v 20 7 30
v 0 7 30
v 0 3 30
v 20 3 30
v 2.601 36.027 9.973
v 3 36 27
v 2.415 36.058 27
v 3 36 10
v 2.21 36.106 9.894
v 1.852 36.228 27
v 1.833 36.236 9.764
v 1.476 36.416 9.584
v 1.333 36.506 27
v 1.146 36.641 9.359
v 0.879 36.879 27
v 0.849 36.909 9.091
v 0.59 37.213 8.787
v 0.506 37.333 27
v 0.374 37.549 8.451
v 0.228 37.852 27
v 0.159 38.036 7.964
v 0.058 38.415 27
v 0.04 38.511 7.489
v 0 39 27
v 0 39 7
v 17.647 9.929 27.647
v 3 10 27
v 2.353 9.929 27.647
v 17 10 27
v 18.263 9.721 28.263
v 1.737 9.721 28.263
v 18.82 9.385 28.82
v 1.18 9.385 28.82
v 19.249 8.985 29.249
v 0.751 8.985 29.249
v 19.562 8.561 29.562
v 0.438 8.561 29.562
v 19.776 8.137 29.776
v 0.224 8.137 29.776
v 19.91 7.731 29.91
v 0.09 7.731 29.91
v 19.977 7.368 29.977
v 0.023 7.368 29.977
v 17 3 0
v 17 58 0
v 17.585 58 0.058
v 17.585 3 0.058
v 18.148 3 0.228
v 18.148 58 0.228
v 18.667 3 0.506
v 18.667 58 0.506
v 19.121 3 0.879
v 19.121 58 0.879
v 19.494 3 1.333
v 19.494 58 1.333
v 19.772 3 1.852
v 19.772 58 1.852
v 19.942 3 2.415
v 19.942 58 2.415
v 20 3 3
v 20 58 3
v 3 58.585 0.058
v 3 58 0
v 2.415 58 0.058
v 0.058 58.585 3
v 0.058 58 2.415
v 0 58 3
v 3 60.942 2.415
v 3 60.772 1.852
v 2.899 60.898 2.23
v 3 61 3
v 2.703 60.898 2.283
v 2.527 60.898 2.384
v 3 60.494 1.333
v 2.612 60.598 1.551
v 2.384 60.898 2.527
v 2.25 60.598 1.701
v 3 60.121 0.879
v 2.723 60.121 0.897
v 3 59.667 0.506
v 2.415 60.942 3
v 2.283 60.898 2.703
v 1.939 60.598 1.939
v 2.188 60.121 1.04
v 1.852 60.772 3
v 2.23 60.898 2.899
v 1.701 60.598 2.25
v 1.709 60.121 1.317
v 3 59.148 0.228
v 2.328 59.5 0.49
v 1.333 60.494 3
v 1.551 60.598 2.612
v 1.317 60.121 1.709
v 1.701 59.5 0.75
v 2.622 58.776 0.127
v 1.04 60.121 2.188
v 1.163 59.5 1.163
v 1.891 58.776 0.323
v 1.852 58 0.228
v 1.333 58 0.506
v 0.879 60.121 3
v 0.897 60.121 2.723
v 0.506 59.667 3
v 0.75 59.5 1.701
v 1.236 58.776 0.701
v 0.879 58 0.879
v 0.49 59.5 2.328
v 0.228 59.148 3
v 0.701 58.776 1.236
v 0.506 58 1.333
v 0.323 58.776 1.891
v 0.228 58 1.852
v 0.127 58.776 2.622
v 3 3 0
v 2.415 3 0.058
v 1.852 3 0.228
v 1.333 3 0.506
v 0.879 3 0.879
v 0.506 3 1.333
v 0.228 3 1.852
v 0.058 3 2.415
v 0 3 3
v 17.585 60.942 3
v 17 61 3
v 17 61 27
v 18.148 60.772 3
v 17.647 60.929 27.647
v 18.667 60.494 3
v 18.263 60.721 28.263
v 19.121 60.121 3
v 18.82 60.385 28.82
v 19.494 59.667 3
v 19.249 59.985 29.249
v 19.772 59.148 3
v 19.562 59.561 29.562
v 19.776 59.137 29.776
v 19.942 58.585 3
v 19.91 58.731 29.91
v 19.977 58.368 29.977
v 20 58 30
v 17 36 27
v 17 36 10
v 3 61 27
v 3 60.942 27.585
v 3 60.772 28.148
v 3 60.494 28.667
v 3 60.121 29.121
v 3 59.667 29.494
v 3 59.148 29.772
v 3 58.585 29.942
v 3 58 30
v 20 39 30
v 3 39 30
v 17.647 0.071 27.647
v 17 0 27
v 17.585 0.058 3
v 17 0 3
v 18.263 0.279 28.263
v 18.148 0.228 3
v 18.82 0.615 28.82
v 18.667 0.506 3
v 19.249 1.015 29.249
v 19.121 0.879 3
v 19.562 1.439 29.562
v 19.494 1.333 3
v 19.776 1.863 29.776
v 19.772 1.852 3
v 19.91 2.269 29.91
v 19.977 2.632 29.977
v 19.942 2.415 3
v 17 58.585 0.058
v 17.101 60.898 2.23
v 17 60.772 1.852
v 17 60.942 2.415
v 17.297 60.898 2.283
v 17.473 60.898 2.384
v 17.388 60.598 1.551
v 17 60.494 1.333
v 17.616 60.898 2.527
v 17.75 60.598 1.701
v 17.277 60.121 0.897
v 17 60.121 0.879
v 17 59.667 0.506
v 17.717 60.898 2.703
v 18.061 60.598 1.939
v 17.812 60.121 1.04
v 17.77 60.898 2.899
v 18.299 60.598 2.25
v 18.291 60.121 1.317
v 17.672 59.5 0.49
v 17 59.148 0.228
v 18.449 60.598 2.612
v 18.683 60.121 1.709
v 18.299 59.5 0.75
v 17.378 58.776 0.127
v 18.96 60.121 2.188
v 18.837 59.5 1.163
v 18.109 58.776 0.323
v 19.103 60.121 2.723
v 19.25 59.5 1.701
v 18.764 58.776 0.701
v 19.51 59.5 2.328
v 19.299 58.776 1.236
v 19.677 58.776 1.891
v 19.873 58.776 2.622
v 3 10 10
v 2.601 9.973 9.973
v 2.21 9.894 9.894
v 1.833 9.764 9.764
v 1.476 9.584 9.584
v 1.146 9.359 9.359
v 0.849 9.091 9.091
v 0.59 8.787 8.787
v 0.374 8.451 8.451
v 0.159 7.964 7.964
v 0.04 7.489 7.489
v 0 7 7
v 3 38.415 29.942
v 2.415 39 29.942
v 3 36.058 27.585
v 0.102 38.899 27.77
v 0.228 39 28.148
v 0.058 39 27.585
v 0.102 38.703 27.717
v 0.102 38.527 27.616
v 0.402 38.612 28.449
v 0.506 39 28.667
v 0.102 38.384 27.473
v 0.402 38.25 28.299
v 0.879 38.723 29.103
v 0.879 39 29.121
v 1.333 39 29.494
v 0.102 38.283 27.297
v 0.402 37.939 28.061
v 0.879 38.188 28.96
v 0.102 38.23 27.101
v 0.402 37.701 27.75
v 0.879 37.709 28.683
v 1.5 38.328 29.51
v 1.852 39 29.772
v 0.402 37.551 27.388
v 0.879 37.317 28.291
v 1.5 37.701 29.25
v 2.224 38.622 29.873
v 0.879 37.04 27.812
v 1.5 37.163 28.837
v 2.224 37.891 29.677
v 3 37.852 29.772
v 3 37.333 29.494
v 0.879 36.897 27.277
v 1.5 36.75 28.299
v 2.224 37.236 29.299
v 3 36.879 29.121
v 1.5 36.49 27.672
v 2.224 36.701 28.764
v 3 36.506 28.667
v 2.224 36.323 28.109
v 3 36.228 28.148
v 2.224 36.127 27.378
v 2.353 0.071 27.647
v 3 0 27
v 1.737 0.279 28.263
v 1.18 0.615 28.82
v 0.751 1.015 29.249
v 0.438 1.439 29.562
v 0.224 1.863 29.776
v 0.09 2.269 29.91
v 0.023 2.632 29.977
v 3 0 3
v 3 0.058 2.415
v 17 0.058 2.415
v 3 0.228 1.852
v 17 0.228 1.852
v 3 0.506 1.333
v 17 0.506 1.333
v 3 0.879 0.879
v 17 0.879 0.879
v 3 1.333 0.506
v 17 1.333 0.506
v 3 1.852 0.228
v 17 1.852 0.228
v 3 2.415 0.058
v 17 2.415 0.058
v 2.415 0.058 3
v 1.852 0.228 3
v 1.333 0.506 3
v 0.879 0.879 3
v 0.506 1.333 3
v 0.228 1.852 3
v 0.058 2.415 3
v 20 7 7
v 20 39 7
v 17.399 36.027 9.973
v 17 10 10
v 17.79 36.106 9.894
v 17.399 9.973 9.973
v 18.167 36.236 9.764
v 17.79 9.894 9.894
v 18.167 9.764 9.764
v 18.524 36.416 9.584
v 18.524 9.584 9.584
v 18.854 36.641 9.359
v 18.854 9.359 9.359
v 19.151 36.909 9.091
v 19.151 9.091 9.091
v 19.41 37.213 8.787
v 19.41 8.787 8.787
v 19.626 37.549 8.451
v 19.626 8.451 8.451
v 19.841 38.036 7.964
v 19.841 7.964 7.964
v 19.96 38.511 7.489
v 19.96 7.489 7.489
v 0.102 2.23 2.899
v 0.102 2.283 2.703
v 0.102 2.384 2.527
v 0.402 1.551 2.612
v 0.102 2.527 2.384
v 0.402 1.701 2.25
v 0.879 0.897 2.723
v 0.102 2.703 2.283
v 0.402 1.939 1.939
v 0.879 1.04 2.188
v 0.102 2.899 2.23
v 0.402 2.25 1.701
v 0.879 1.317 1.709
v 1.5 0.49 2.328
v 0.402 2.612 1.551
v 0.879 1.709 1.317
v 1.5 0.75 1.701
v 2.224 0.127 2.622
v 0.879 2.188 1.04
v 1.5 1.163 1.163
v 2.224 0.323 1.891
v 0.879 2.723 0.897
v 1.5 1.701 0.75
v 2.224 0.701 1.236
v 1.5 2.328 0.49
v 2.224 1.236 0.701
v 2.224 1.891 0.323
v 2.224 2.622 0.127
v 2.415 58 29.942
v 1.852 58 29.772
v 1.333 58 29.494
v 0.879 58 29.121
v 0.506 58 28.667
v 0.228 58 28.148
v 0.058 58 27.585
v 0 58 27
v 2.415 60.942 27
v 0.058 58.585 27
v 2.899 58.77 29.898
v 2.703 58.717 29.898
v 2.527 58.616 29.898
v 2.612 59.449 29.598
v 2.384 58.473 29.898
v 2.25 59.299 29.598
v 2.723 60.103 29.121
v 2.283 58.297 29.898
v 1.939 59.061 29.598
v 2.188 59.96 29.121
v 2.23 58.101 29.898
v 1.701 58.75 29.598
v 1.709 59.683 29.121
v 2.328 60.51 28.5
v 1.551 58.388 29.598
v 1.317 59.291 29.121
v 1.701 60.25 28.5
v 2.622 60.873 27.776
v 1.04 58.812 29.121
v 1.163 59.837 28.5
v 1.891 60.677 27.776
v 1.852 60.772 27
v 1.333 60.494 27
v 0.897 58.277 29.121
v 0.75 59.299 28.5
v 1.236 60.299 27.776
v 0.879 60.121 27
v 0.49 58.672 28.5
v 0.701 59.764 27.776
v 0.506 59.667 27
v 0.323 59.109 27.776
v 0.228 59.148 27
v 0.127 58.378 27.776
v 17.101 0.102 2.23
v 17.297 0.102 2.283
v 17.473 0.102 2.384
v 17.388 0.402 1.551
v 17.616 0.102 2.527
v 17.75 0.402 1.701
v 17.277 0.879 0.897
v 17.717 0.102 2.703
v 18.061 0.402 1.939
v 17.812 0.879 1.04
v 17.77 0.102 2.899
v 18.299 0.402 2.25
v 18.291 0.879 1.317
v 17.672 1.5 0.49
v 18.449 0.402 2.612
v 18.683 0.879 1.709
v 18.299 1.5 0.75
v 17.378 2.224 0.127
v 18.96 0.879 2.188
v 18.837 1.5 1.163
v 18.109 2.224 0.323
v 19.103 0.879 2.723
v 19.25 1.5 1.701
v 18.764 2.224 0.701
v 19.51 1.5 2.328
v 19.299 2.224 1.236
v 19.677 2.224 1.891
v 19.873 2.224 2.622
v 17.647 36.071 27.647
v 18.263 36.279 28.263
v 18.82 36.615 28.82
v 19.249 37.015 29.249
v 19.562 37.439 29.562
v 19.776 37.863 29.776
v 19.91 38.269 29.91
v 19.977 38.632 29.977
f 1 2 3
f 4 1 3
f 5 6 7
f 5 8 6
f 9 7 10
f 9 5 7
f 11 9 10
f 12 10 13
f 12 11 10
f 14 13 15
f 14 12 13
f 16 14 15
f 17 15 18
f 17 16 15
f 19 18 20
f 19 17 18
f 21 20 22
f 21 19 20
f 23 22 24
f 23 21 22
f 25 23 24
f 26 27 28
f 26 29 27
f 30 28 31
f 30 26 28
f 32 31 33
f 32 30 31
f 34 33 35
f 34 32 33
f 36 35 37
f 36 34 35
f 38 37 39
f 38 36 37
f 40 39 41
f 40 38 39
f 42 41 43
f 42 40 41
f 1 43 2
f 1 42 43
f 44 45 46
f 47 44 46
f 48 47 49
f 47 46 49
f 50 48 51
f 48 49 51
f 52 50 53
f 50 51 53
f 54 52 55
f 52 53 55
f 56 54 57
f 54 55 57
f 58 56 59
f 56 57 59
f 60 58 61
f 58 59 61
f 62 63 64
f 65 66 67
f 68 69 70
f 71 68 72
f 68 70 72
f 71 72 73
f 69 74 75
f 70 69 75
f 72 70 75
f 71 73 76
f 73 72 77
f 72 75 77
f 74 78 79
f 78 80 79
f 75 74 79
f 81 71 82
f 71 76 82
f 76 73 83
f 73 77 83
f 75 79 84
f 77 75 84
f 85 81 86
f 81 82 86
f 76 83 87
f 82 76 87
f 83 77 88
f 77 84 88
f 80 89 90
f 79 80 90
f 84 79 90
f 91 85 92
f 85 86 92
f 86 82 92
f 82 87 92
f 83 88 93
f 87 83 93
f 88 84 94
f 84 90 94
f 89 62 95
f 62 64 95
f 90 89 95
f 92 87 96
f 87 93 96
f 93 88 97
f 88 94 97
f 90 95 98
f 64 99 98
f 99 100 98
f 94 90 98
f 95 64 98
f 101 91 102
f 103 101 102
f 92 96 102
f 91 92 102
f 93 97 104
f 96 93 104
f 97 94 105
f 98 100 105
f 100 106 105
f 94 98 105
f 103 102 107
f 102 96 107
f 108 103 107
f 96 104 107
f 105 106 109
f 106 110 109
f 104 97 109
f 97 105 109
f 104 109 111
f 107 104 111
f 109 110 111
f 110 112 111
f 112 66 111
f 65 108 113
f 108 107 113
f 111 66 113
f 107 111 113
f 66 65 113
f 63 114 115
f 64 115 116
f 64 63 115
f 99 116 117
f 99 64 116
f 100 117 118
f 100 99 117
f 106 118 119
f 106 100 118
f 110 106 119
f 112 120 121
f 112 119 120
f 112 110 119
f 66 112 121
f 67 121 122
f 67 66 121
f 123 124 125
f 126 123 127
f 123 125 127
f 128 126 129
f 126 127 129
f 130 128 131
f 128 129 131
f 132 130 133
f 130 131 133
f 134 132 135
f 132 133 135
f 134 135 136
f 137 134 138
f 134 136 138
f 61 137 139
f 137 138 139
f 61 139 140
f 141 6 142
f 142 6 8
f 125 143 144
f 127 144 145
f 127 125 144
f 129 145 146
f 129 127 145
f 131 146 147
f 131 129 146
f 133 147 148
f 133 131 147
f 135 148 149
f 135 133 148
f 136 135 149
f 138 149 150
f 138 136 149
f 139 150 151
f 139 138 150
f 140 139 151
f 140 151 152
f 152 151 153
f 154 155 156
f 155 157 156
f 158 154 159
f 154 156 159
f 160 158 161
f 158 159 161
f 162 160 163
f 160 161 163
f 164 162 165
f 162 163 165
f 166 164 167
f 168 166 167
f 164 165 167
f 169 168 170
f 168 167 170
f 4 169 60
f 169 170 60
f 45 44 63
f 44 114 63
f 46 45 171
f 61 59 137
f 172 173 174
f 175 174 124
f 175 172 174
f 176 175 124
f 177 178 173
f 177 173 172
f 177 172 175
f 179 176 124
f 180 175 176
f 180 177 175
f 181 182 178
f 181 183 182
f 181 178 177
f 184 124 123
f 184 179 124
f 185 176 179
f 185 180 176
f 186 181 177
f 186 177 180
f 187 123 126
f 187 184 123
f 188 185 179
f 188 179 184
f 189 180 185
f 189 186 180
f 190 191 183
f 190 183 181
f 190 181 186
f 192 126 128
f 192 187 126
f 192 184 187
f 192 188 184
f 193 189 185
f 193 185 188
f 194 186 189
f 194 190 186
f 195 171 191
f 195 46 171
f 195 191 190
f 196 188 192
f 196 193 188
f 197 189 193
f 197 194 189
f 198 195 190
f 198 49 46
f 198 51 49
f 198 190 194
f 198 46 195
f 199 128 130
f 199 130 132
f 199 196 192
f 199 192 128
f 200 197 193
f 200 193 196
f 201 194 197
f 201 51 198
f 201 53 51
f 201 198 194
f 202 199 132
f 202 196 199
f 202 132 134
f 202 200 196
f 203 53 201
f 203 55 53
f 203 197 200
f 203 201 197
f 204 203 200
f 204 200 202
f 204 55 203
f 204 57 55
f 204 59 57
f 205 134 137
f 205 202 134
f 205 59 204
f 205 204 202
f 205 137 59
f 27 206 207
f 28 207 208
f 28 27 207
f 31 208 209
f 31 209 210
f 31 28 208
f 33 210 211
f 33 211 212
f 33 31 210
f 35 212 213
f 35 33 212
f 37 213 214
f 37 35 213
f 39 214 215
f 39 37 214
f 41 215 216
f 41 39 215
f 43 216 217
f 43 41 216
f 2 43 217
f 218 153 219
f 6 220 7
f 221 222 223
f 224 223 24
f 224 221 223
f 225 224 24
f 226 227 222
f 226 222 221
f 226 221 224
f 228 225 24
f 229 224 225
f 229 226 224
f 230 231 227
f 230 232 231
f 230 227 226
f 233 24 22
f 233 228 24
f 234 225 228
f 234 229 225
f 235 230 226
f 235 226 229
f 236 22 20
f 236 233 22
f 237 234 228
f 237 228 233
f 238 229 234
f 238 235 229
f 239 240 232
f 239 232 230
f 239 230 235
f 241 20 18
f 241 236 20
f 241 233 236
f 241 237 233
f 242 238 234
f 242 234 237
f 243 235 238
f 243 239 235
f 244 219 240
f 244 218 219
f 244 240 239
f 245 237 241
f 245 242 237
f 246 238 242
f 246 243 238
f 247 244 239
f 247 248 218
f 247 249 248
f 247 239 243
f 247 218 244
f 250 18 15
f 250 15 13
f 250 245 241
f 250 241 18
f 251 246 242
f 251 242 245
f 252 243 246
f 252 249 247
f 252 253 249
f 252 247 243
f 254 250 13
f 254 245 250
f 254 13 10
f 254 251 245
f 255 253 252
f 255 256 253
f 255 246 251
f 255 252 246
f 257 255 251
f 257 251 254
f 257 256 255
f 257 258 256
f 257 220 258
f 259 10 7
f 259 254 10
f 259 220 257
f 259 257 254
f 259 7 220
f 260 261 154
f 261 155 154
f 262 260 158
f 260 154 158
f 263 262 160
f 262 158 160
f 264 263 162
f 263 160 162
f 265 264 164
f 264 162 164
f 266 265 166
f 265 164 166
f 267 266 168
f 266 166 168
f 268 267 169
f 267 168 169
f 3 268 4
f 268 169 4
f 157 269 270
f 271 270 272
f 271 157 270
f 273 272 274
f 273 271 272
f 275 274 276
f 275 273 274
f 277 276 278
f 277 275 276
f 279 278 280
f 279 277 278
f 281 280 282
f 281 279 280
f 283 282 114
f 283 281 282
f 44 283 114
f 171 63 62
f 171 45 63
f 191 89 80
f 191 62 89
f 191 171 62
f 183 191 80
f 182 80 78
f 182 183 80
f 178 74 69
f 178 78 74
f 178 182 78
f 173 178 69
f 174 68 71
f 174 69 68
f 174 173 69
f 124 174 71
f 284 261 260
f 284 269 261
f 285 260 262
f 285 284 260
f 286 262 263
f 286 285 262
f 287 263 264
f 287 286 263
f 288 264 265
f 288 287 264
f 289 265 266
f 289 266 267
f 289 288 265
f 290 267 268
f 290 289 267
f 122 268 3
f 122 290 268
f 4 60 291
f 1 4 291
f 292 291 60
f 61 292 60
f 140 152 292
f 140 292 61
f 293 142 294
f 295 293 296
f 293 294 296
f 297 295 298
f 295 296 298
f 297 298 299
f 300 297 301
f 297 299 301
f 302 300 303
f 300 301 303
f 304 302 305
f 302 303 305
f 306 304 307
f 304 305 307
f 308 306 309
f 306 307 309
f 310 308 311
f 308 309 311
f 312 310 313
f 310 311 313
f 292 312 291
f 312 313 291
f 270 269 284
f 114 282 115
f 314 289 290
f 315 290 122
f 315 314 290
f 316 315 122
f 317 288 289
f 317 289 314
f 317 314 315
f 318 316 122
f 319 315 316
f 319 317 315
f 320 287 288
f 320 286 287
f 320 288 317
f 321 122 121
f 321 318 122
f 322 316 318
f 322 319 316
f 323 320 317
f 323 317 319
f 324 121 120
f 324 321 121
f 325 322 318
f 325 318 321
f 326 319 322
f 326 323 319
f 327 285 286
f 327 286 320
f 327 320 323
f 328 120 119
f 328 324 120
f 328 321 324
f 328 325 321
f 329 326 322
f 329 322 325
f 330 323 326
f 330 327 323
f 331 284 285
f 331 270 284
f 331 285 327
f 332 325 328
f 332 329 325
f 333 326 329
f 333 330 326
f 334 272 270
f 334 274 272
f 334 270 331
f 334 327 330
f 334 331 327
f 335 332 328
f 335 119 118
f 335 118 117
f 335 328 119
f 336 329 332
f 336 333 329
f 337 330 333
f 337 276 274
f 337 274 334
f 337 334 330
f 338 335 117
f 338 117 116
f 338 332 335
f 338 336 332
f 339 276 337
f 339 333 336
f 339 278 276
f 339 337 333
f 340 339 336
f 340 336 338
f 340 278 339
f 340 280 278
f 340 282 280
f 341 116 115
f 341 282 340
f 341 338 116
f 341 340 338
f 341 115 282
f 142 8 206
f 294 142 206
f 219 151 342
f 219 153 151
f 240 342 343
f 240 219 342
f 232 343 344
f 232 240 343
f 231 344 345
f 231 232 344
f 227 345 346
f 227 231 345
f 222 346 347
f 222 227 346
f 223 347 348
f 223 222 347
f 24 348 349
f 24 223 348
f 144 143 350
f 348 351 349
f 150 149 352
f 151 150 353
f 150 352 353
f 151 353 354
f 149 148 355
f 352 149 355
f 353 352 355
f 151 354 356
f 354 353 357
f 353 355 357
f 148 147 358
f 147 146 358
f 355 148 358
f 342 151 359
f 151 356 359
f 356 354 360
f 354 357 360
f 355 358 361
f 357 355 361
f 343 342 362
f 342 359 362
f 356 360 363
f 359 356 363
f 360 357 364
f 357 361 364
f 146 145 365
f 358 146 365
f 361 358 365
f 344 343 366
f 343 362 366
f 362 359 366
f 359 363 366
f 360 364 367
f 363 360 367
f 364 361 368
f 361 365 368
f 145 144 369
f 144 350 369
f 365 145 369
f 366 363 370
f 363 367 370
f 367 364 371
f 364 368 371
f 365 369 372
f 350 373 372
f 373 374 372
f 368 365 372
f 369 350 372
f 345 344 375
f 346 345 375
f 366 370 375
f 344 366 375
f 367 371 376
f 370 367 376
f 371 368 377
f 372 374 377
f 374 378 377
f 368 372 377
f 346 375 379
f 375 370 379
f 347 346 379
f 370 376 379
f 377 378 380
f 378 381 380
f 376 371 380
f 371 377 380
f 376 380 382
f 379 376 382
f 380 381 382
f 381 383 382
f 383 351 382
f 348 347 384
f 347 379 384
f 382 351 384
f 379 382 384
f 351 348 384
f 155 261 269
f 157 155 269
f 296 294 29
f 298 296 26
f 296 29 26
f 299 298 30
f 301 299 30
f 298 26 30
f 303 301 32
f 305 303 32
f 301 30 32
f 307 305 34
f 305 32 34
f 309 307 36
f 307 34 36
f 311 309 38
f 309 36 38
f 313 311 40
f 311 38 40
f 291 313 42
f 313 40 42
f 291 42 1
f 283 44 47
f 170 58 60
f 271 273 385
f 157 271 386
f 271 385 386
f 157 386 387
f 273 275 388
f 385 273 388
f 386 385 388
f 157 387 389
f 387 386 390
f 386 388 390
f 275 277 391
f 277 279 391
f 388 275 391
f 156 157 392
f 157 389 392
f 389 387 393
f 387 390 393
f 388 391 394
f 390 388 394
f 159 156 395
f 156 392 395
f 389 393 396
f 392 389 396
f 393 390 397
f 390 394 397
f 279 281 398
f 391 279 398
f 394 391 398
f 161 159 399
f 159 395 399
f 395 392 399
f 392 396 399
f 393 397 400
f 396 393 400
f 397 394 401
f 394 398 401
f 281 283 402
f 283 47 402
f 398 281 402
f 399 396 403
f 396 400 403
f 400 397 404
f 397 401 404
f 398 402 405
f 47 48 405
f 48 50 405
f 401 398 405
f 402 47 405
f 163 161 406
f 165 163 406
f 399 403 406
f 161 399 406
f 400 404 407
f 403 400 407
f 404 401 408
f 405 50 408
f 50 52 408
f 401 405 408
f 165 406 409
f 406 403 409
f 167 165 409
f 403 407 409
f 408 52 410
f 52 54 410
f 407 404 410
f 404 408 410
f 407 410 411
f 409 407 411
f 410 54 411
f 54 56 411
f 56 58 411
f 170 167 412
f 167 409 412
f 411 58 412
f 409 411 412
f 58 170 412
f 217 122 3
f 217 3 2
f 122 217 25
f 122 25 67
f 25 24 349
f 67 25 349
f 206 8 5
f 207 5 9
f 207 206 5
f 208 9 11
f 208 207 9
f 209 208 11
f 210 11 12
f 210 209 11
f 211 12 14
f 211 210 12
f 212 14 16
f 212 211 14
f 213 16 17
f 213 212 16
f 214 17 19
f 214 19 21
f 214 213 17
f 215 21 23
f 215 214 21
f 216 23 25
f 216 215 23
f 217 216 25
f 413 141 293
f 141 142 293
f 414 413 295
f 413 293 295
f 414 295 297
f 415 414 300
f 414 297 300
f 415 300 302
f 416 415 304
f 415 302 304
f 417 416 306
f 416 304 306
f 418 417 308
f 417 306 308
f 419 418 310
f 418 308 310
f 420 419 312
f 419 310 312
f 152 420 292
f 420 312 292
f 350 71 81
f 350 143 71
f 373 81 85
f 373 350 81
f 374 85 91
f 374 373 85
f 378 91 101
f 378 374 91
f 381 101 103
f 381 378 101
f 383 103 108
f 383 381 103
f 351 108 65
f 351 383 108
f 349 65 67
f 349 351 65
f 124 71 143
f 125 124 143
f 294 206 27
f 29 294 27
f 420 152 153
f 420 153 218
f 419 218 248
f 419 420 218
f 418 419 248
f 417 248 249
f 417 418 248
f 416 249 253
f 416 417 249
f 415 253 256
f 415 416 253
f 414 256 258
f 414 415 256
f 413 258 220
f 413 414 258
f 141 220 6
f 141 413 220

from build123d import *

# Parameters (mm, degrees)
F1_DEPTH = 20
F2_R     = 3


with BuildPart() as f1:
    # F0 (on Right) → F1 (new body)
    with BuildSketch(Plane.YZ):
        Polygon((0, 30), (0, 0), (61, 0), (61, 30), (36, 30), (36, 10), (10, 10), (10, 30), align=None)
    extrude(amount=F1_DEPTH)

    # F2
    f2_edges = [f1.edges().sort_by_distance(p)[0] for p in [
        (20, 30.5, 0),
        (10, 0, 0),
        (20, 0, 15),
        (0, 0, 15),
        (0, 30.5, 0),
        (10, 0, 30),
        (10, 61, 0),
        (0, 61, 15),
        (20, 61, 15),
        (10, 61, 30),
        (20, 23, 10),
        (20, 36, 20),
        (20, 10, 20),
        (10, 10, 30),
        (10, 36, 30),
        (0, 48.5, 30),
        (0, 23, 10),
        (0, 36, 20),
        (0, 10, 20),
    ]]
    fillet(f2_edges, radius=F2_R)


solid = f1.part
